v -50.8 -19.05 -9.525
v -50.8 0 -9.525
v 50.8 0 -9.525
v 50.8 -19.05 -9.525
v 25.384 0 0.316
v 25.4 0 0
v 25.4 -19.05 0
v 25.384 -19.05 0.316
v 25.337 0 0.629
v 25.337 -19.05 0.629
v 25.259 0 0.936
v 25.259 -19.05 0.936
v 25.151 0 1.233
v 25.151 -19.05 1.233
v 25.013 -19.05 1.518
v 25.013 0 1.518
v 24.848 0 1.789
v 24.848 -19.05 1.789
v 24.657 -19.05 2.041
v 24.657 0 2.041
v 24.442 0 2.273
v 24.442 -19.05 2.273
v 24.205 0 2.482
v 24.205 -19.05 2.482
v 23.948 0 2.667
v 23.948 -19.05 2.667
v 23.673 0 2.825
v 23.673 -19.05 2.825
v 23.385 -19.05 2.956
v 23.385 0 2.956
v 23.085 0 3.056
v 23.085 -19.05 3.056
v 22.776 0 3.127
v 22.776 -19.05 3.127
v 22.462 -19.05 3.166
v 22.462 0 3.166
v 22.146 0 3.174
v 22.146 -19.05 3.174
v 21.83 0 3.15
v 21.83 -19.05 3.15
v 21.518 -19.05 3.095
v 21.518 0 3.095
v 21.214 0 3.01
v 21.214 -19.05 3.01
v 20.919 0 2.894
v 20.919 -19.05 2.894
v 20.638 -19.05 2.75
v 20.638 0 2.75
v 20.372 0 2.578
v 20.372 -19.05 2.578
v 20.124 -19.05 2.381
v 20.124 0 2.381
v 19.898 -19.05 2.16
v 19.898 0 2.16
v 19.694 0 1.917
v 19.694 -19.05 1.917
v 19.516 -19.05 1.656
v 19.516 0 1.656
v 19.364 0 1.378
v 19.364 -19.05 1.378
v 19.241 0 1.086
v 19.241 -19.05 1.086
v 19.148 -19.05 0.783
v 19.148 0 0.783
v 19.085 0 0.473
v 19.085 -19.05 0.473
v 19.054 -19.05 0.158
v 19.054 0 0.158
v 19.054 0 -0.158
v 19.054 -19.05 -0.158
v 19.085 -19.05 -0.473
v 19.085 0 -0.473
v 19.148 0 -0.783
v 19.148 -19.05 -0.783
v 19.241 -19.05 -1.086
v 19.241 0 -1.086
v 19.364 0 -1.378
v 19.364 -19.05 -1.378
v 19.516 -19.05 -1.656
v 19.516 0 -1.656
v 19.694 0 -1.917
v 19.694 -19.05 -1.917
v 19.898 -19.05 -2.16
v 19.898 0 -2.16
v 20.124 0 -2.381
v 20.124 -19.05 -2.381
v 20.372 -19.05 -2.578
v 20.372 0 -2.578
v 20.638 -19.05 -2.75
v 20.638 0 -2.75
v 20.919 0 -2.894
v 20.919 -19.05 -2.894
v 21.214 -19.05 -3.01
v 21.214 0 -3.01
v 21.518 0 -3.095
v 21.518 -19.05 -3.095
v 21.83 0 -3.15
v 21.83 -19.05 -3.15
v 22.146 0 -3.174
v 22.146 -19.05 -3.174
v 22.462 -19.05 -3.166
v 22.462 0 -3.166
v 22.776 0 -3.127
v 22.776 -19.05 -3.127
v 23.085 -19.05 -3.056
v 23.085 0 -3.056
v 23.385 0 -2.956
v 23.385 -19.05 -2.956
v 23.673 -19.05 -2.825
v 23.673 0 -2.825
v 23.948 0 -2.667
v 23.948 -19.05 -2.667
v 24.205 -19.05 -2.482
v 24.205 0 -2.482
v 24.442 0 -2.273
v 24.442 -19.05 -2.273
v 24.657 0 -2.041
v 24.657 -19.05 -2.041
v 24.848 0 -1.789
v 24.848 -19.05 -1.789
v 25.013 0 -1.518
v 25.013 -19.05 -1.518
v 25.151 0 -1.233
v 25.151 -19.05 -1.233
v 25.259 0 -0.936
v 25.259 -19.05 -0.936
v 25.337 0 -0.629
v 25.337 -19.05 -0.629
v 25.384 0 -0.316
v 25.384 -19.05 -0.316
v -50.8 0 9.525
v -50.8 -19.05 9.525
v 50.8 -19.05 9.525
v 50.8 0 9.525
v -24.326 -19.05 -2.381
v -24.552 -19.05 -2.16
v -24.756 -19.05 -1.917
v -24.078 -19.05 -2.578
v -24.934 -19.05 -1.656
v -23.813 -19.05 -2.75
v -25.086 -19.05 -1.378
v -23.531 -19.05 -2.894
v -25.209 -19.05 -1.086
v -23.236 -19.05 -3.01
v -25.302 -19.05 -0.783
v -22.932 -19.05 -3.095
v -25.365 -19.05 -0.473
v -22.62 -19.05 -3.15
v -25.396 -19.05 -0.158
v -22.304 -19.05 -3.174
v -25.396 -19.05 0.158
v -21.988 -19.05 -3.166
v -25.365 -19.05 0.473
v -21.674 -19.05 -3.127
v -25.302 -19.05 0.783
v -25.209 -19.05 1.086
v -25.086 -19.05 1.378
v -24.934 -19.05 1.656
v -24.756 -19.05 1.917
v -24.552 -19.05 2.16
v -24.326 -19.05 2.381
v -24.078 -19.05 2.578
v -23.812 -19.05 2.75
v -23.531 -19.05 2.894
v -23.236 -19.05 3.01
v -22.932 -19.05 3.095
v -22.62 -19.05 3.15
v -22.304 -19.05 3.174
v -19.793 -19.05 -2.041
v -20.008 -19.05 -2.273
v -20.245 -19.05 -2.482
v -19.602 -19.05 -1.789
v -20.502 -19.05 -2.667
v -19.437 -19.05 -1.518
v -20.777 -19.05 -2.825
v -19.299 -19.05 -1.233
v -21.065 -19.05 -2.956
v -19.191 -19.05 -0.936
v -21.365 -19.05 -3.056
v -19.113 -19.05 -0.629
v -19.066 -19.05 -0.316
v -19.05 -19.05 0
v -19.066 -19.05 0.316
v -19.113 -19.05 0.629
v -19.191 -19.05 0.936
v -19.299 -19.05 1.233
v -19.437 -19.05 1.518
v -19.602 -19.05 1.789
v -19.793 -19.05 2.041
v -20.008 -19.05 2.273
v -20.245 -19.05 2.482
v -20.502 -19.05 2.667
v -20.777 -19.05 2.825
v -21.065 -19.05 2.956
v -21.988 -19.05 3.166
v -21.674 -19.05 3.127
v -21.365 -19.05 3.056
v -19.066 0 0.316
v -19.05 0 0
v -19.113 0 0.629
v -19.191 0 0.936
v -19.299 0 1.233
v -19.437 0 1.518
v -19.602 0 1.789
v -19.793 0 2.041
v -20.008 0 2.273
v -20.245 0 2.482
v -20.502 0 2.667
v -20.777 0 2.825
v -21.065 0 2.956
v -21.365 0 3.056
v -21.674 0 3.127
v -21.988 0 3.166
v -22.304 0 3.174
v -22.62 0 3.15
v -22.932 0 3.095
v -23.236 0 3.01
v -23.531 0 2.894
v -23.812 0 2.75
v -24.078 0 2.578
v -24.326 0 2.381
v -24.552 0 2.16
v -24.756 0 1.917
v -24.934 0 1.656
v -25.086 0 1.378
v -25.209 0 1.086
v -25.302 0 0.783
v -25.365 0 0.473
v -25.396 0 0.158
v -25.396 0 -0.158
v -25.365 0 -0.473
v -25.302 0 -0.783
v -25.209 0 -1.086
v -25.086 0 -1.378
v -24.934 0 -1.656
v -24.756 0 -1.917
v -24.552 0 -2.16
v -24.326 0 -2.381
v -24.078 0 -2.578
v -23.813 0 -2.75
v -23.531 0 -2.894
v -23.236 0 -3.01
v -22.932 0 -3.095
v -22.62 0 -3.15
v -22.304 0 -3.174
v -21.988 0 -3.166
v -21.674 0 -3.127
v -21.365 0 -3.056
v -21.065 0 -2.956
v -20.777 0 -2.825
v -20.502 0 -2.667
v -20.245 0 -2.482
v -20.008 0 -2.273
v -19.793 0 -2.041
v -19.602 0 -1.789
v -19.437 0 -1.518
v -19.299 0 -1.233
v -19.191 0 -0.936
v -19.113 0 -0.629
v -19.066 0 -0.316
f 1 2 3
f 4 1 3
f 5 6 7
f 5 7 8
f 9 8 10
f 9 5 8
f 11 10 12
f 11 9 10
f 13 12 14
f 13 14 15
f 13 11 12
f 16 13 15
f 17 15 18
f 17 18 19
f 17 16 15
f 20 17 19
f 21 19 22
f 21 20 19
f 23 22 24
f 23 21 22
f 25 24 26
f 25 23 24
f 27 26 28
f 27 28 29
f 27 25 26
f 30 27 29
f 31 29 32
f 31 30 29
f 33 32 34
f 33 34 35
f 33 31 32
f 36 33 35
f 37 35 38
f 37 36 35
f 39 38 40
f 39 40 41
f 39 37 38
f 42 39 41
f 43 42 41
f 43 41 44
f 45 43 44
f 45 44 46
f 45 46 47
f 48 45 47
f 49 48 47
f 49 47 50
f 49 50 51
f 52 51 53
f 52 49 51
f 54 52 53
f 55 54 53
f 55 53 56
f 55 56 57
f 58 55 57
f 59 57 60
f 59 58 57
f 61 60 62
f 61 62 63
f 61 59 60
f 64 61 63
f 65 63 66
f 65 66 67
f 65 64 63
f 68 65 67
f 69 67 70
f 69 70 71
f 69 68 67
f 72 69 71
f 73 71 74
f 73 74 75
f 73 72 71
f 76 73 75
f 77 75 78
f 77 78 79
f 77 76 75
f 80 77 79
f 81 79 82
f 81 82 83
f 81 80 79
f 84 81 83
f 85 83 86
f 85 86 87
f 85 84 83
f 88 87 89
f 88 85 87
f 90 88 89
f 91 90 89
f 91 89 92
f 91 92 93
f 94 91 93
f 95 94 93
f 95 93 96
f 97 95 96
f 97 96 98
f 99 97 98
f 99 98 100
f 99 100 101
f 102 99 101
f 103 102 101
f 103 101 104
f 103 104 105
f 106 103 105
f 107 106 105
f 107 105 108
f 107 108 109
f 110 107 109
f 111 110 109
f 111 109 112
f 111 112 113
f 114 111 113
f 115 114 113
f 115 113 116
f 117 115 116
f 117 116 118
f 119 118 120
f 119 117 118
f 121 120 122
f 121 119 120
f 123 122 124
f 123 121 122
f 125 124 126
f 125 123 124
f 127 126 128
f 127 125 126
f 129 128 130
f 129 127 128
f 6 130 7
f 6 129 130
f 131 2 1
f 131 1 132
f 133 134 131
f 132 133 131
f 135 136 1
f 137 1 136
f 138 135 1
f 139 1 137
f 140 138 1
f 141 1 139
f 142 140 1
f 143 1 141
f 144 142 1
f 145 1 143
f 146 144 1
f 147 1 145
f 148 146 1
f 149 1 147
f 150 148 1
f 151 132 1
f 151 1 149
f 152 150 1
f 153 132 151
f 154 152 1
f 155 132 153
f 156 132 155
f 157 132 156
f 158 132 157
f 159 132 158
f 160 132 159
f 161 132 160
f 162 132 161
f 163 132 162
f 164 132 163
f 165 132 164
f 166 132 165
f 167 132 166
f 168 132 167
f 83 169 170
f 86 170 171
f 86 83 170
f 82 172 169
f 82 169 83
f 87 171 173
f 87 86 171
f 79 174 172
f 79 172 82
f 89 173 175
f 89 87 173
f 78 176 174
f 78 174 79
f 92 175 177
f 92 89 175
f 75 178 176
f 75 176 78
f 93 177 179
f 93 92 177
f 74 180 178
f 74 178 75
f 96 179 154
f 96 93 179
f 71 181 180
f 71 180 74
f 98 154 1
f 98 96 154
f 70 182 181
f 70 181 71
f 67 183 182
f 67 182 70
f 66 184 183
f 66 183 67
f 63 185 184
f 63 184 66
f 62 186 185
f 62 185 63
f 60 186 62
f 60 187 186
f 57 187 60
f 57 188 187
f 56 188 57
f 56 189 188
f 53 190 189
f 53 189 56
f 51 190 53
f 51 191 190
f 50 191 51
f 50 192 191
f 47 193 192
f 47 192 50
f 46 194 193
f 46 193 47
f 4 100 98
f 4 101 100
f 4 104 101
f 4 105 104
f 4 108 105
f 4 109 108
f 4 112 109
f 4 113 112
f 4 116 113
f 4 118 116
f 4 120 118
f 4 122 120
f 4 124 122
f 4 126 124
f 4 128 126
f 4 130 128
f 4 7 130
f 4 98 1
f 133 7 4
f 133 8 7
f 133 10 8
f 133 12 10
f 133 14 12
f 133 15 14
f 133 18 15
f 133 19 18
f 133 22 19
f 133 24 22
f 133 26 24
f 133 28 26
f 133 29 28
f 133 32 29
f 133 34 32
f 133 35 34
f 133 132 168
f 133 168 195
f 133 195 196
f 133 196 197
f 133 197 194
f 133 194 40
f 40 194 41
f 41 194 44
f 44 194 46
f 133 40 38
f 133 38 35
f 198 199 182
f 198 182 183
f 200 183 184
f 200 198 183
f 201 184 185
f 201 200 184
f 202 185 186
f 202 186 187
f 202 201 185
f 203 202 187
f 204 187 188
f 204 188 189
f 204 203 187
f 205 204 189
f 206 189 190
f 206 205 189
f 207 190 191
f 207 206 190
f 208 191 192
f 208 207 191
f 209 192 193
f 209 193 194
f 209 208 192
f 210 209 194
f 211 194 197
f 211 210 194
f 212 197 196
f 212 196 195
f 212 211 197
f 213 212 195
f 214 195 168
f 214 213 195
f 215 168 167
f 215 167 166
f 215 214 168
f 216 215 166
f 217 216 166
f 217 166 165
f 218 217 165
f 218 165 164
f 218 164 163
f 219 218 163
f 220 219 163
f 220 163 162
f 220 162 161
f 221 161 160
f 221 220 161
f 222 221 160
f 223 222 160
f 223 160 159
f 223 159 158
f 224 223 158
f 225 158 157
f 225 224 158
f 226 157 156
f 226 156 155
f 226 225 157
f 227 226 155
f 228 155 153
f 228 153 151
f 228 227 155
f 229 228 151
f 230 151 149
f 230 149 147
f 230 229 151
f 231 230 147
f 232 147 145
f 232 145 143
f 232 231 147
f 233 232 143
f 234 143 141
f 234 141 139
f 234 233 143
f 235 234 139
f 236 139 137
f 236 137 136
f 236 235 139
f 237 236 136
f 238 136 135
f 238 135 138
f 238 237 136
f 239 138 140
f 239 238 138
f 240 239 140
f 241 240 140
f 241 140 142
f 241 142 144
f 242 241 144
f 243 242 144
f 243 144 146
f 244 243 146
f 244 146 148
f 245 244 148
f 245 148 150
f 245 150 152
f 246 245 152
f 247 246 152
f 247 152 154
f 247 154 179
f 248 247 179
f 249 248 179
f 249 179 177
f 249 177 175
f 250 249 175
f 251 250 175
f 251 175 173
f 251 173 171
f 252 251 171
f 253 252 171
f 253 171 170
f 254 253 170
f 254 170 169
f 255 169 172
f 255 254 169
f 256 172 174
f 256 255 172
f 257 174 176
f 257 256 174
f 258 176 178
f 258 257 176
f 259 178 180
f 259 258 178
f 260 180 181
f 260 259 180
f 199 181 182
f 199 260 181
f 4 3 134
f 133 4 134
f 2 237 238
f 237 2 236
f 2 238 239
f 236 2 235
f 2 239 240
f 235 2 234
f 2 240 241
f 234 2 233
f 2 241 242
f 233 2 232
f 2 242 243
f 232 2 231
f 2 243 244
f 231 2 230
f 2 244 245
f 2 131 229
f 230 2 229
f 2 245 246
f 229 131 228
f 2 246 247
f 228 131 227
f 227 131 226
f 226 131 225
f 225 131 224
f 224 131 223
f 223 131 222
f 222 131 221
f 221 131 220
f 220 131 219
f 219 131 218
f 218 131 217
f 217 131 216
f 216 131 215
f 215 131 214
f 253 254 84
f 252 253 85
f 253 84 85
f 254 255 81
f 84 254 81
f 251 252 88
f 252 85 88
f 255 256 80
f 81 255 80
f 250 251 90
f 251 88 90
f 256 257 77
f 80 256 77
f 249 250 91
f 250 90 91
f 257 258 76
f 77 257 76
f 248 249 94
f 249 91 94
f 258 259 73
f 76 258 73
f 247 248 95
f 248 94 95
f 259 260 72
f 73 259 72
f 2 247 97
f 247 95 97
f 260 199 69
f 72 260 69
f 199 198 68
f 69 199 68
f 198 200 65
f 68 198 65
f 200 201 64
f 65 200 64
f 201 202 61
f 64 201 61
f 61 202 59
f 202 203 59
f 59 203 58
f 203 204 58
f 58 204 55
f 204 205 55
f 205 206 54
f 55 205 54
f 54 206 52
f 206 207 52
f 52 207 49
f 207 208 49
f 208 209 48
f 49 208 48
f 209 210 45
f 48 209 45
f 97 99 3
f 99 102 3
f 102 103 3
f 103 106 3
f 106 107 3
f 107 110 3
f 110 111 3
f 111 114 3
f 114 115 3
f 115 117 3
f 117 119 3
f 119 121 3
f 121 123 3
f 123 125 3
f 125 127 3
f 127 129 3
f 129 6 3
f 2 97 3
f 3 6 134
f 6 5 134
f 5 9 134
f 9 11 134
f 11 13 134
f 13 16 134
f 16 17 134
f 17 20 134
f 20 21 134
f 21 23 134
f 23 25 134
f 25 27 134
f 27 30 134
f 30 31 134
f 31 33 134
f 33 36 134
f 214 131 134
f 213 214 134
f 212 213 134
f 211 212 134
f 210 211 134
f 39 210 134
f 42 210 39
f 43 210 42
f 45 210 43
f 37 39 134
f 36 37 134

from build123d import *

# Parameters (mm, degrees)
F3_W     = 63.5
F3_H     = 19.05
F3_R     = 3.175
F3_W_2   = 19.05
F4_DEPTH = 19.05


with BuildPart() as f4:
    # F3 (on Front) → F4 (new body)
    with BuildSketch(Plane.XZ):
        Rectangle(F3_W, F3_H)
        with Locations((-22.225, 0)):
            Circle(F3_R, mode=Mode.SUBTRACT)
        with Locations((22.225, 0)):
            Circle(F3_R, mode=Mode.SUBTRACT)
        with Locations((41.275, 0)):
            Rectangle(F3_W_2, F3_H)
        with Locations((-41.275, 0)):
            Rectangle(F3_W_2, F3_H)
    extrude(amount=F4_DEPTH)


solid = f4.part
